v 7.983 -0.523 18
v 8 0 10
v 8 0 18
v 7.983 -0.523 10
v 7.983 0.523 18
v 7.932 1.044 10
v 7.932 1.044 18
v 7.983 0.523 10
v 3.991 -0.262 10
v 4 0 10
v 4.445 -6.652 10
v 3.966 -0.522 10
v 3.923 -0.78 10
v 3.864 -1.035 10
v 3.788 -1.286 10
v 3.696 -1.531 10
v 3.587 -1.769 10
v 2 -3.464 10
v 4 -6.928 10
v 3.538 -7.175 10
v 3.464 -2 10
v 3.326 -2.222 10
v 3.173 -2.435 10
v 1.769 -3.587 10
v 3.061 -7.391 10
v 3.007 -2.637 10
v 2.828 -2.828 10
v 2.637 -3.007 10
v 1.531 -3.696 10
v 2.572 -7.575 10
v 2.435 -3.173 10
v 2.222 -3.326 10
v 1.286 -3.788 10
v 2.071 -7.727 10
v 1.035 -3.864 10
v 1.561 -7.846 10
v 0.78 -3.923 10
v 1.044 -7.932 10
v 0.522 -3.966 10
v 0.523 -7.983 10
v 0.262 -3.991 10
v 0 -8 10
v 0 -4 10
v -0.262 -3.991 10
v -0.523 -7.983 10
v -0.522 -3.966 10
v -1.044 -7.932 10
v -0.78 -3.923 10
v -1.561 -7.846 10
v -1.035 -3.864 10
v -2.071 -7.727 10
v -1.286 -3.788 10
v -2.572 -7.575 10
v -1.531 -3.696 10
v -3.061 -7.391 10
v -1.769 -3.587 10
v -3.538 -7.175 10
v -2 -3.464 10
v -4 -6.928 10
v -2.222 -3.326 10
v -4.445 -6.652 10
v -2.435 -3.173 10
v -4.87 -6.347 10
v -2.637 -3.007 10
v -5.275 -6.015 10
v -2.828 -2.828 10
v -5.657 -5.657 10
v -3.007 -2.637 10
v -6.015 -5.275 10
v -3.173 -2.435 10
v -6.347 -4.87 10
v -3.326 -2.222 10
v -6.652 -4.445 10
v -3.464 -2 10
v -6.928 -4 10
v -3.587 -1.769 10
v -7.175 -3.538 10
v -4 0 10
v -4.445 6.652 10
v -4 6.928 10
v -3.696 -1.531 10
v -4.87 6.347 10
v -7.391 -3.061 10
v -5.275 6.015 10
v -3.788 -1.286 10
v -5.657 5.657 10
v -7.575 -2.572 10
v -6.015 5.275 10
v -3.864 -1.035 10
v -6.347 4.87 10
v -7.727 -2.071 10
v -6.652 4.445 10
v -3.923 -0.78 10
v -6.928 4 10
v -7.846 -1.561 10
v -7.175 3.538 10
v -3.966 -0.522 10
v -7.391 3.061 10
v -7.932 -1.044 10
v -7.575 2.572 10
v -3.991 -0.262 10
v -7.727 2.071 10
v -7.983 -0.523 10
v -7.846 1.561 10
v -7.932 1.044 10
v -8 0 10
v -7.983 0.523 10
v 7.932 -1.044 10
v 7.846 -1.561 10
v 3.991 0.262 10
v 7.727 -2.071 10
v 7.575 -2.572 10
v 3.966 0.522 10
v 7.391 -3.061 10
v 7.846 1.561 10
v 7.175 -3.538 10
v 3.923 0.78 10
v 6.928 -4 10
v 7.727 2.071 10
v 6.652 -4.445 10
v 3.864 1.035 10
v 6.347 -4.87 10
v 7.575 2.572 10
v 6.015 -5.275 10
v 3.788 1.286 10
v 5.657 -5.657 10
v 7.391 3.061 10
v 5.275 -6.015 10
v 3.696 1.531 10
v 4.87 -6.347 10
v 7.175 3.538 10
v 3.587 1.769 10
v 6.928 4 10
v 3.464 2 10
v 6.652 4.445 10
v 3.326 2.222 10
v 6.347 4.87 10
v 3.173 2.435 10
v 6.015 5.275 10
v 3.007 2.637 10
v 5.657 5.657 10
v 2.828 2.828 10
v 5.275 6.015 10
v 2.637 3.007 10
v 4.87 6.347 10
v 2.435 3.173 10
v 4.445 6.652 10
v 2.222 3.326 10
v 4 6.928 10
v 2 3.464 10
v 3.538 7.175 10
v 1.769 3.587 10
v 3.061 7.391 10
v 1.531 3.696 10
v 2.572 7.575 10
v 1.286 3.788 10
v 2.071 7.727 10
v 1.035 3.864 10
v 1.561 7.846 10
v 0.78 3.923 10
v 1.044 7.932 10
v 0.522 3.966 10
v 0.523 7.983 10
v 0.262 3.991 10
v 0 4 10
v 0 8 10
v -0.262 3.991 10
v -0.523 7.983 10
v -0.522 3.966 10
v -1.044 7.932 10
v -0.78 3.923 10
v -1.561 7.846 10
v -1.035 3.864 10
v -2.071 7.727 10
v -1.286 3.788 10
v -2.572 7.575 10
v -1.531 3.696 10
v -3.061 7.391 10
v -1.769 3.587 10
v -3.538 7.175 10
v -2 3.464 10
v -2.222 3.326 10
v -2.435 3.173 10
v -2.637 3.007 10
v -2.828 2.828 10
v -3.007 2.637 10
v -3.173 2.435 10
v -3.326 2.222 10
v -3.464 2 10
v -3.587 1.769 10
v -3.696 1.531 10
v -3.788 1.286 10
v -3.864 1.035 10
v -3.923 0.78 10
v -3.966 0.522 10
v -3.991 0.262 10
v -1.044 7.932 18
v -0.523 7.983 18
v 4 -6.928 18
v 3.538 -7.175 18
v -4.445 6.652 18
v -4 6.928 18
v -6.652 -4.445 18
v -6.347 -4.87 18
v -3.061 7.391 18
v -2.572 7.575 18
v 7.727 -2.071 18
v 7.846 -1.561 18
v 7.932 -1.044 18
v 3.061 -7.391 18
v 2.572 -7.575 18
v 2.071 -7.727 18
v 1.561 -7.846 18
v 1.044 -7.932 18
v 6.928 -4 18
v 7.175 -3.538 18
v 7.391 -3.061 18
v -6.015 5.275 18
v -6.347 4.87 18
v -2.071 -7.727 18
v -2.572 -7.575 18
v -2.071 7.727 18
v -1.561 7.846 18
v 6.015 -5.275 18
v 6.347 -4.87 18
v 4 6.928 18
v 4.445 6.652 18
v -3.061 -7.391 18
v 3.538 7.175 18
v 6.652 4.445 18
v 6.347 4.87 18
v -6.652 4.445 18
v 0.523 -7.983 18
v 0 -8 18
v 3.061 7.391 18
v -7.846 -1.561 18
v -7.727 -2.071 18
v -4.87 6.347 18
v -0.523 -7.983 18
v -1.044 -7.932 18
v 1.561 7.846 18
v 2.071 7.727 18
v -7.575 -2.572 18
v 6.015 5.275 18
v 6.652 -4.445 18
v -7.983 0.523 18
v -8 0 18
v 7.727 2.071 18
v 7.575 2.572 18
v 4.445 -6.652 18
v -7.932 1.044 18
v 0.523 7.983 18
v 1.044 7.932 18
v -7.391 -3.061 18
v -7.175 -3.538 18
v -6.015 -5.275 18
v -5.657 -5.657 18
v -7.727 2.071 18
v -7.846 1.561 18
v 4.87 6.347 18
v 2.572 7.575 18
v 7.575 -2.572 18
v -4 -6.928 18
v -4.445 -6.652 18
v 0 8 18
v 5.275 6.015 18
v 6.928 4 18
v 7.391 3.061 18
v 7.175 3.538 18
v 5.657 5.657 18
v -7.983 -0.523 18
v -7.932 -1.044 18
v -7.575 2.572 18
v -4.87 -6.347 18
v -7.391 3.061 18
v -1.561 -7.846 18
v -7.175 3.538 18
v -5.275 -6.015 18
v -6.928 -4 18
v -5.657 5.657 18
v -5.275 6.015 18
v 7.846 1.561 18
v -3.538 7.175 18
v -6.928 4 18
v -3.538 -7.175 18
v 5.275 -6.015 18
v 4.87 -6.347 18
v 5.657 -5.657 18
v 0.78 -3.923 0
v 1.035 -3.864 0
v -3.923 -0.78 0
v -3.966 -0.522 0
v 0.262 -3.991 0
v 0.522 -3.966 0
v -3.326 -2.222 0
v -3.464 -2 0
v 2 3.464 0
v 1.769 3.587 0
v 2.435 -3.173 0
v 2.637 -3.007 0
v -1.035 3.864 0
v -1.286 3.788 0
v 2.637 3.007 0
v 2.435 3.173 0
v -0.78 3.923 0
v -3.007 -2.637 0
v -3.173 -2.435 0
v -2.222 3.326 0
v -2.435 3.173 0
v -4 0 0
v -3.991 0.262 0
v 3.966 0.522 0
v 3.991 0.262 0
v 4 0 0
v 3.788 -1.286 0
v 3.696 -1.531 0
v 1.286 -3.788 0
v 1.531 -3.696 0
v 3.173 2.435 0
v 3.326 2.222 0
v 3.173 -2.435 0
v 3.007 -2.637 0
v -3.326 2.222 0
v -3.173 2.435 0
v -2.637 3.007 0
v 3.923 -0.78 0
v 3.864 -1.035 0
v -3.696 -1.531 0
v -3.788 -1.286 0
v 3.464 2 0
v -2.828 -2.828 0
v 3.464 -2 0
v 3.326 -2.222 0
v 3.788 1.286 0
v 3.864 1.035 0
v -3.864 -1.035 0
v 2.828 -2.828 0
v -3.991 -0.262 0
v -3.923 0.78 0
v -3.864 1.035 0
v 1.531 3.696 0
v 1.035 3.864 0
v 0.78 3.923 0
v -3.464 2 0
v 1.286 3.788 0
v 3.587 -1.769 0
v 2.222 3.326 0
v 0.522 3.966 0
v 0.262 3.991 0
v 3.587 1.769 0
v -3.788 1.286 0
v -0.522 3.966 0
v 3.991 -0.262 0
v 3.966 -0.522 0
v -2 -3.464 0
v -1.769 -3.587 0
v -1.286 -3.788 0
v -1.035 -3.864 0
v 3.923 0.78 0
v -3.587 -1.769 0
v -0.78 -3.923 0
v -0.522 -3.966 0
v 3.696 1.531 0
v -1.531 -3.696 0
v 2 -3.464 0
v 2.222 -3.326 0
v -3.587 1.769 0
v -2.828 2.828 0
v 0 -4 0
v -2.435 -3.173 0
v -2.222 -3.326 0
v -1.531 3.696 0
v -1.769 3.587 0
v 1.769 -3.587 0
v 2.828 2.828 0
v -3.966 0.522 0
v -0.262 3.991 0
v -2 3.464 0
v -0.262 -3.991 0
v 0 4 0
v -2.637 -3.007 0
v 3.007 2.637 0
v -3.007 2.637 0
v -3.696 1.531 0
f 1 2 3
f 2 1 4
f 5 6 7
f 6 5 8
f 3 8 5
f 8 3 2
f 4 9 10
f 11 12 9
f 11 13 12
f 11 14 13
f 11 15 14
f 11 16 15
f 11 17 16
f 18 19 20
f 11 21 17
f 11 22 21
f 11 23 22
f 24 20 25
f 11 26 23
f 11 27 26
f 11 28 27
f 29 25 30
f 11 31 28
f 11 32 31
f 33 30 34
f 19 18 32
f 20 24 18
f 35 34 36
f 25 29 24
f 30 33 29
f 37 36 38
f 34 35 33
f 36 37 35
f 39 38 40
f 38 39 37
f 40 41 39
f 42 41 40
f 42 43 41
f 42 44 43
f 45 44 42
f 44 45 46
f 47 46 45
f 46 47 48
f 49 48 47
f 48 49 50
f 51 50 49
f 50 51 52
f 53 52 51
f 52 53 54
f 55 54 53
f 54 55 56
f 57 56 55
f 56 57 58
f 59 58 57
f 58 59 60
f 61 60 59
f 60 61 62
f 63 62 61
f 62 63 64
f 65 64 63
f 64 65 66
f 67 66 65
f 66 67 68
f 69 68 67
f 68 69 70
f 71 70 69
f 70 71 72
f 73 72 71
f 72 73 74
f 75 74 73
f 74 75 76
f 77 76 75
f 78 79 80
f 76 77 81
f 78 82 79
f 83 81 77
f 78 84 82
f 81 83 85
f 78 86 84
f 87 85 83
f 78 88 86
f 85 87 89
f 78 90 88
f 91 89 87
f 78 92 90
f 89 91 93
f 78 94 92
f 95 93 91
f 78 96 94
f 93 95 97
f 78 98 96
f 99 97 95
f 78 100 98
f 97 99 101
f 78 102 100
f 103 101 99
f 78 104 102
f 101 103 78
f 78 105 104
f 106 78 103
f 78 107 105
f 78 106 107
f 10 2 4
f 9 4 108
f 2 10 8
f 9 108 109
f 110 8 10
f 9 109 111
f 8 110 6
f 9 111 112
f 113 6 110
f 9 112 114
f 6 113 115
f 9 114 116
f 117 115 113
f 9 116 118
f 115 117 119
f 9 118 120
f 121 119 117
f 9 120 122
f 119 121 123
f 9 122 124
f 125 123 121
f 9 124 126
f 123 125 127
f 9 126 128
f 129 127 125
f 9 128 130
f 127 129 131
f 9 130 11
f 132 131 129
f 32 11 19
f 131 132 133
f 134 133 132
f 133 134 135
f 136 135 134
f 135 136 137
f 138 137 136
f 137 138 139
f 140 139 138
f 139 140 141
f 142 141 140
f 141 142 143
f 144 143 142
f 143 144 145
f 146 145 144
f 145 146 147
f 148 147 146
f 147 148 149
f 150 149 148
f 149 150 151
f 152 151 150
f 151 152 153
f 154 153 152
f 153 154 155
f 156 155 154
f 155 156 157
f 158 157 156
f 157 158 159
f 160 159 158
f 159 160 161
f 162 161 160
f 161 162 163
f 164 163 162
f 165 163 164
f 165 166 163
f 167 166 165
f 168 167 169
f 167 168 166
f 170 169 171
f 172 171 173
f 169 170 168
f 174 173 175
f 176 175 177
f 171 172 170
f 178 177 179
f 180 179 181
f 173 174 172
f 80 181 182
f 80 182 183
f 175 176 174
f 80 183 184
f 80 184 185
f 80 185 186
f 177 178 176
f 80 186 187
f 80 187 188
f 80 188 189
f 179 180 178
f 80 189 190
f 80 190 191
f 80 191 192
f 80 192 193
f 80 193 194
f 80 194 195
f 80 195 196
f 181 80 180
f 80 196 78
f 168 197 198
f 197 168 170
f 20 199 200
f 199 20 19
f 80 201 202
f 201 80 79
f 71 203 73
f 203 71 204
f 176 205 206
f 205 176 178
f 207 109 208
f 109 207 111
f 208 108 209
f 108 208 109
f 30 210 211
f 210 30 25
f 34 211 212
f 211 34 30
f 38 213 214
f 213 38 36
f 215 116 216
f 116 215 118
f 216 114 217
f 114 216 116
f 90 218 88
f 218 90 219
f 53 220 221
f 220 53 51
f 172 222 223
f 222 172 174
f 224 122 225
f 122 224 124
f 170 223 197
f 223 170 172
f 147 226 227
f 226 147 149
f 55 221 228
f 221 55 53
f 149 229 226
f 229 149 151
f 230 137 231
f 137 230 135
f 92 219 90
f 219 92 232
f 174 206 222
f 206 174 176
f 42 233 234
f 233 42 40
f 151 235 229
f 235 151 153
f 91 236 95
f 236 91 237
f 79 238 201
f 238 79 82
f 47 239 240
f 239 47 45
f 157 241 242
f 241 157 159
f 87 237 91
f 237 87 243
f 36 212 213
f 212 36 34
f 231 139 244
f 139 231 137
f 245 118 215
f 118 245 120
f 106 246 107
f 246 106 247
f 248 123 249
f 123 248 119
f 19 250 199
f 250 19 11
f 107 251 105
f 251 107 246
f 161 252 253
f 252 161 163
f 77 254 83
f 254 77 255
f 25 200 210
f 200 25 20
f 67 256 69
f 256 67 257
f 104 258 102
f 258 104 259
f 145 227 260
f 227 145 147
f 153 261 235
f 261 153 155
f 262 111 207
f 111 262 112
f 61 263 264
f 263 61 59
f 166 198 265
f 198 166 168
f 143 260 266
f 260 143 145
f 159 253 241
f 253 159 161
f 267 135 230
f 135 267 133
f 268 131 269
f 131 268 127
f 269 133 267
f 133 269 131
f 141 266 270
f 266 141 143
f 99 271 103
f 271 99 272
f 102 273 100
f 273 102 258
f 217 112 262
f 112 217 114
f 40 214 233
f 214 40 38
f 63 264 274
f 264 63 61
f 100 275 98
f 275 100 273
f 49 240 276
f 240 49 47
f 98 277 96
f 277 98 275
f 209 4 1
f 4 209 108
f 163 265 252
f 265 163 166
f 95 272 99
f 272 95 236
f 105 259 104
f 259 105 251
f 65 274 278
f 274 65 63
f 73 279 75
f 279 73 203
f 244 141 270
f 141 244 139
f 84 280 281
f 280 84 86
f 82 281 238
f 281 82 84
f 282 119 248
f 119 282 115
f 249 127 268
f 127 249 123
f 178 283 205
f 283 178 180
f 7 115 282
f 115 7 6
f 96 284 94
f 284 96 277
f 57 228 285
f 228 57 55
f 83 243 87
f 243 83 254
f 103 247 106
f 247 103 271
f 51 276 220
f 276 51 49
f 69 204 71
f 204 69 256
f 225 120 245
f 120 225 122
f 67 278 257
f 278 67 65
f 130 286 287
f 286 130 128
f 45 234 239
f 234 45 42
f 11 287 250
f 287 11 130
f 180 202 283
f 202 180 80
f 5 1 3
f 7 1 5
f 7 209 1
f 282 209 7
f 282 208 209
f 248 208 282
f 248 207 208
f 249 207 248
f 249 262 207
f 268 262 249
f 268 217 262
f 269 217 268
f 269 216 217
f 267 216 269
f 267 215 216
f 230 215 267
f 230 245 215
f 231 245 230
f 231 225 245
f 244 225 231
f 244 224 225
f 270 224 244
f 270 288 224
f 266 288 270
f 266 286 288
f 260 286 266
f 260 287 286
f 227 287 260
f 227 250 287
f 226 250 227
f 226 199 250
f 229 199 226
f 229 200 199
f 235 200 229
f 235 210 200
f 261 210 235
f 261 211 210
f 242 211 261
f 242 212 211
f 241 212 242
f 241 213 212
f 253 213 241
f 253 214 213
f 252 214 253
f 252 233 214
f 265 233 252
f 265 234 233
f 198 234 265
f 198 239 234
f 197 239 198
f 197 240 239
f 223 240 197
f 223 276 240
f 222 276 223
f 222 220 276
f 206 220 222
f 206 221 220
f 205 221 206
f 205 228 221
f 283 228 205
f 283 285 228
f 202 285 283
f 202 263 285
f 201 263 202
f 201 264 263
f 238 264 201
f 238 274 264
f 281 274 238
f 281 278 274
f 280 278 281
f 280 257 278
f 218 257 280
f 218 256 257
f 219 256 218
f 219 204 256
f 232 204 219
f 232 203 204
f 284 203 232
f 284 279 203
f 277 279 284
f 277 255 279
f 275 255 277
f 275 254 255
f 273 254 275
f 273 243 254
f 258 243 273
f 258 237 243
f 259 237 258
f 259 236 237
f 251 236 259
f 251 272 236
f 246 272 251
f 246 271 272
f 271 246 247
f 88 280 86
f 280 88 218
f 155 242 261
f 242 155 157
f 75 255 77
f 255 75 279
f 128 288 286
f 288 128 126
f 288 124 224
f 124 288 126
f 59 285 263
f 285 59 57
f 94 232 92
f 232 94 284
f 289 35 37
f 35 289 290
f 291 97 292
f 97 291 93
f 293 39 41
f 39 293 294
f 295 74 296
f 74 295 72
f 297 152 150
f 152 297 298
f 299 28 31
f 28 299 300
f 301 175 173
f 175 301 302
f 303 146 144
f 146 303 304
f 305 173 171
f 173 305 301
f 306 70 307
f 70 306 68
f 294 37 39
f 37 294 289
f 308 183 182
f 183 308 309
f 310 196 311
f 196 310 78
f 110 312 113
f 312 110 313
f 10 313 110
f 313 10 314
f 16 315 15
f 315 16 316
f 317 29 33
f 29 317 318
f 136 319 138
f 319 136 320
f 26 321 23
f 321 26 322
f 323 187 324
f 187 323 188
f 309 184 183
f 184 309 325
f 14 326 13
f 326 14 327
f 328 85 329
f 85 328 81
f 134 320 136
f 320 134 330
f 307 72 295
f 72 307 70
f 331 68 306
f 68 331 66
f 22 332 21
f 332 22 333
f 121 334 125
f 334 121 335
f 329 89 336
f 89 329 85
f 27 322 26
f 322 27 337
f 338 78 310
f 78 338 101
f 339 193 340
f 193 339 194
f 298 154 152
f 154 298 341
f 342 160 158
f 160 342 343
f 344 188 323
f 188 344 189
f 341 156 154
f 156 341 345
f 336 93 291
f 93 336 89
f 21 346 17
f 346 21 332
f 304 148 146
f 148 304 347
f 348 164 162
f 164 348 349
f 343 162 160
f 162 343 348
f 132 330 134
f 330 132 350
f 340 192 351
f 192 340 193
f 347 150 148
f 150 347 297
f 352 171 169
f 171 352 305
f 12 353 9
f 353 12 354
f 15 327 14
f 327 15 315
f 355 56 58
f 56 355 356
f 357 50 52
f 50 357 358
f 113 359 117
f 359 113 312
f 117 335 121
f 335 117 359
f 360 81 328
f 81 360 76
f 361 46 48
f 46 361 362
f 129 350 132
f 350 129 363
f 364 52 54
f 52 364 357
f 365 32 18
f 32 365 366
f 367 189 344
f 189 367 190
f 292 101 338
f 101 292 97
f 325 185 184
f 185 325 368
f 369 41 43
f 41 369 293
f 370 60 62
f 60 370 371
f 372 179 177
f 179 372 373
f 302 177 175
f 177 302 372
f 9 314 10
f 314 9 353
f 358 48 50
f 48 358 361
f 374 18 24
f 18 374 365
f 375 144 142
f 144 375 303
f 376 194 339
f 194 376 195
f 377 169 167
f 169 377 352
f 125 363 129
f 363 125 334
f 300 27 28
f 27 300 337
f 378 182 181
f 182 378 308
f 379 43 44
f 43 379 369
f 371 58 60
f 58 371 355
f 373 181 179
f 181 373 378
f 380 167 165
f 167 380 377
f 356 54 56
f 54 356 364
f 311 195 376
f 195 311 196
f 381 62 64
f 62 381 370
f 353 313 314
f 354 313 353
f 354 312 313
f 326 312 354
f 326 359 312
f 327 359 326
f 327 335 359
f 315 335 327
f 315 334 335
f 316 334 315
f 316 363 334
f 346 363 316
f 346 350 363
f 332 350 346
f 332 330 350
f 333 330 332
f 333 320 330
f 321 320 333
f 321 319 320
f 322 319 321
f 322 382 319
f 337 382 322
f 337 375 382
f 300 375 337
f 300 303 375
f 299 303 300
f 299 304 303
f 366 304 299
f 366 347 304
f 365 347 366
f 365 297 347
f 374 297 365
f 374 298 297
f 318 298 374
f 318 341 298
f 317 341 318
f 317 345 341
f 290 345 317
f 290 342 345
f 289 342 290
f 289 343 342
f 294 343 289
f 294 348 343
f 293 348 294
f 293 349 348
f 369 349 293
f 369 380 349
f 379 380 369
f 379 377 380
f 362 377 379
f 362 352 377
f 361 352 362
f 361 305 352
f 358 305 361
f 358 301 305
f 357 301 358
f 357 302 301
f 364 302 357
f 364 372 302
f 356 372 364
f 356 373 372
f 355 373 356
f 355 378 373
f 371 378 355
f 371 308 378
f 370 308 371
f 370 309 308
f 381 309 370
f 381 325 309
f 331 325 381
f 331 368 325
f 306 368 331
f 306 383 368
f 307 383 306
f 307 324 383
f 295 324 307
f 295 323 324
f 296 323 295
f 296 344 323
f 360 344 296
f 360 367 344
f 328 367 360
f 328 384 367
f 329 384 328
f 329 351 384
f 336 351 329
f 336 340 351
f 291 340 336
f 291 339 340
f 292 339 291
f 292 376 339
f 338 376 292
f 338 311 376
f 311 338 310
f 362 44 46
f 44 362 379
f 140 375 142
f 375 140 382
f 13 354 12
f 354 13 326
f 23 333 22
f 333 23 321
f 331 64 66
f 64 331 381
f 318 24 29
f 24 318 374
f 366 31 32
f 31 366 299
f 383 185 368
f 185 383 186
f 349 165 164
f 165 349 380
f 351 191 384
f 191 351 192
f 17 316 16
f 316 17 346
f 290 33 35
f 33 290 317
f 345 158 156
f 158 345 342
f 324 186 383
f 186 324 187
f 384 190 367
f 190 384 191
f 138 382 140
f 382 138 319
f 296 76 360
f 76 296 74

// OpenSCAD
$fn=96;

d_shaft = 8.0;
L = 10.0;

d_head = 16.0;
h_head = 8.0;

d_socket = 8.0;
depth_socket = 5.0;

module socket_head_cap_screw() {
    union() {
        // Shaft
        cylinder(d=d_shaft, h=L);

        // Head
        translate([0,0,L])
            cylinder(d=d_head, h=h_head);

        // Hex socket (subtracted)
        difference() {
            // no-op solid to subtract from: head only
            translate([0,0,L])
                cylinder(d=d_head, h=h_head);
            // hex recess
            translate([0,0,L + h_head - depth_socket])
                cylinder(d=d_socket, h=depth_socket + 0.2, $fn=6);
        }
    }
}

socket_head_cap_screw();
